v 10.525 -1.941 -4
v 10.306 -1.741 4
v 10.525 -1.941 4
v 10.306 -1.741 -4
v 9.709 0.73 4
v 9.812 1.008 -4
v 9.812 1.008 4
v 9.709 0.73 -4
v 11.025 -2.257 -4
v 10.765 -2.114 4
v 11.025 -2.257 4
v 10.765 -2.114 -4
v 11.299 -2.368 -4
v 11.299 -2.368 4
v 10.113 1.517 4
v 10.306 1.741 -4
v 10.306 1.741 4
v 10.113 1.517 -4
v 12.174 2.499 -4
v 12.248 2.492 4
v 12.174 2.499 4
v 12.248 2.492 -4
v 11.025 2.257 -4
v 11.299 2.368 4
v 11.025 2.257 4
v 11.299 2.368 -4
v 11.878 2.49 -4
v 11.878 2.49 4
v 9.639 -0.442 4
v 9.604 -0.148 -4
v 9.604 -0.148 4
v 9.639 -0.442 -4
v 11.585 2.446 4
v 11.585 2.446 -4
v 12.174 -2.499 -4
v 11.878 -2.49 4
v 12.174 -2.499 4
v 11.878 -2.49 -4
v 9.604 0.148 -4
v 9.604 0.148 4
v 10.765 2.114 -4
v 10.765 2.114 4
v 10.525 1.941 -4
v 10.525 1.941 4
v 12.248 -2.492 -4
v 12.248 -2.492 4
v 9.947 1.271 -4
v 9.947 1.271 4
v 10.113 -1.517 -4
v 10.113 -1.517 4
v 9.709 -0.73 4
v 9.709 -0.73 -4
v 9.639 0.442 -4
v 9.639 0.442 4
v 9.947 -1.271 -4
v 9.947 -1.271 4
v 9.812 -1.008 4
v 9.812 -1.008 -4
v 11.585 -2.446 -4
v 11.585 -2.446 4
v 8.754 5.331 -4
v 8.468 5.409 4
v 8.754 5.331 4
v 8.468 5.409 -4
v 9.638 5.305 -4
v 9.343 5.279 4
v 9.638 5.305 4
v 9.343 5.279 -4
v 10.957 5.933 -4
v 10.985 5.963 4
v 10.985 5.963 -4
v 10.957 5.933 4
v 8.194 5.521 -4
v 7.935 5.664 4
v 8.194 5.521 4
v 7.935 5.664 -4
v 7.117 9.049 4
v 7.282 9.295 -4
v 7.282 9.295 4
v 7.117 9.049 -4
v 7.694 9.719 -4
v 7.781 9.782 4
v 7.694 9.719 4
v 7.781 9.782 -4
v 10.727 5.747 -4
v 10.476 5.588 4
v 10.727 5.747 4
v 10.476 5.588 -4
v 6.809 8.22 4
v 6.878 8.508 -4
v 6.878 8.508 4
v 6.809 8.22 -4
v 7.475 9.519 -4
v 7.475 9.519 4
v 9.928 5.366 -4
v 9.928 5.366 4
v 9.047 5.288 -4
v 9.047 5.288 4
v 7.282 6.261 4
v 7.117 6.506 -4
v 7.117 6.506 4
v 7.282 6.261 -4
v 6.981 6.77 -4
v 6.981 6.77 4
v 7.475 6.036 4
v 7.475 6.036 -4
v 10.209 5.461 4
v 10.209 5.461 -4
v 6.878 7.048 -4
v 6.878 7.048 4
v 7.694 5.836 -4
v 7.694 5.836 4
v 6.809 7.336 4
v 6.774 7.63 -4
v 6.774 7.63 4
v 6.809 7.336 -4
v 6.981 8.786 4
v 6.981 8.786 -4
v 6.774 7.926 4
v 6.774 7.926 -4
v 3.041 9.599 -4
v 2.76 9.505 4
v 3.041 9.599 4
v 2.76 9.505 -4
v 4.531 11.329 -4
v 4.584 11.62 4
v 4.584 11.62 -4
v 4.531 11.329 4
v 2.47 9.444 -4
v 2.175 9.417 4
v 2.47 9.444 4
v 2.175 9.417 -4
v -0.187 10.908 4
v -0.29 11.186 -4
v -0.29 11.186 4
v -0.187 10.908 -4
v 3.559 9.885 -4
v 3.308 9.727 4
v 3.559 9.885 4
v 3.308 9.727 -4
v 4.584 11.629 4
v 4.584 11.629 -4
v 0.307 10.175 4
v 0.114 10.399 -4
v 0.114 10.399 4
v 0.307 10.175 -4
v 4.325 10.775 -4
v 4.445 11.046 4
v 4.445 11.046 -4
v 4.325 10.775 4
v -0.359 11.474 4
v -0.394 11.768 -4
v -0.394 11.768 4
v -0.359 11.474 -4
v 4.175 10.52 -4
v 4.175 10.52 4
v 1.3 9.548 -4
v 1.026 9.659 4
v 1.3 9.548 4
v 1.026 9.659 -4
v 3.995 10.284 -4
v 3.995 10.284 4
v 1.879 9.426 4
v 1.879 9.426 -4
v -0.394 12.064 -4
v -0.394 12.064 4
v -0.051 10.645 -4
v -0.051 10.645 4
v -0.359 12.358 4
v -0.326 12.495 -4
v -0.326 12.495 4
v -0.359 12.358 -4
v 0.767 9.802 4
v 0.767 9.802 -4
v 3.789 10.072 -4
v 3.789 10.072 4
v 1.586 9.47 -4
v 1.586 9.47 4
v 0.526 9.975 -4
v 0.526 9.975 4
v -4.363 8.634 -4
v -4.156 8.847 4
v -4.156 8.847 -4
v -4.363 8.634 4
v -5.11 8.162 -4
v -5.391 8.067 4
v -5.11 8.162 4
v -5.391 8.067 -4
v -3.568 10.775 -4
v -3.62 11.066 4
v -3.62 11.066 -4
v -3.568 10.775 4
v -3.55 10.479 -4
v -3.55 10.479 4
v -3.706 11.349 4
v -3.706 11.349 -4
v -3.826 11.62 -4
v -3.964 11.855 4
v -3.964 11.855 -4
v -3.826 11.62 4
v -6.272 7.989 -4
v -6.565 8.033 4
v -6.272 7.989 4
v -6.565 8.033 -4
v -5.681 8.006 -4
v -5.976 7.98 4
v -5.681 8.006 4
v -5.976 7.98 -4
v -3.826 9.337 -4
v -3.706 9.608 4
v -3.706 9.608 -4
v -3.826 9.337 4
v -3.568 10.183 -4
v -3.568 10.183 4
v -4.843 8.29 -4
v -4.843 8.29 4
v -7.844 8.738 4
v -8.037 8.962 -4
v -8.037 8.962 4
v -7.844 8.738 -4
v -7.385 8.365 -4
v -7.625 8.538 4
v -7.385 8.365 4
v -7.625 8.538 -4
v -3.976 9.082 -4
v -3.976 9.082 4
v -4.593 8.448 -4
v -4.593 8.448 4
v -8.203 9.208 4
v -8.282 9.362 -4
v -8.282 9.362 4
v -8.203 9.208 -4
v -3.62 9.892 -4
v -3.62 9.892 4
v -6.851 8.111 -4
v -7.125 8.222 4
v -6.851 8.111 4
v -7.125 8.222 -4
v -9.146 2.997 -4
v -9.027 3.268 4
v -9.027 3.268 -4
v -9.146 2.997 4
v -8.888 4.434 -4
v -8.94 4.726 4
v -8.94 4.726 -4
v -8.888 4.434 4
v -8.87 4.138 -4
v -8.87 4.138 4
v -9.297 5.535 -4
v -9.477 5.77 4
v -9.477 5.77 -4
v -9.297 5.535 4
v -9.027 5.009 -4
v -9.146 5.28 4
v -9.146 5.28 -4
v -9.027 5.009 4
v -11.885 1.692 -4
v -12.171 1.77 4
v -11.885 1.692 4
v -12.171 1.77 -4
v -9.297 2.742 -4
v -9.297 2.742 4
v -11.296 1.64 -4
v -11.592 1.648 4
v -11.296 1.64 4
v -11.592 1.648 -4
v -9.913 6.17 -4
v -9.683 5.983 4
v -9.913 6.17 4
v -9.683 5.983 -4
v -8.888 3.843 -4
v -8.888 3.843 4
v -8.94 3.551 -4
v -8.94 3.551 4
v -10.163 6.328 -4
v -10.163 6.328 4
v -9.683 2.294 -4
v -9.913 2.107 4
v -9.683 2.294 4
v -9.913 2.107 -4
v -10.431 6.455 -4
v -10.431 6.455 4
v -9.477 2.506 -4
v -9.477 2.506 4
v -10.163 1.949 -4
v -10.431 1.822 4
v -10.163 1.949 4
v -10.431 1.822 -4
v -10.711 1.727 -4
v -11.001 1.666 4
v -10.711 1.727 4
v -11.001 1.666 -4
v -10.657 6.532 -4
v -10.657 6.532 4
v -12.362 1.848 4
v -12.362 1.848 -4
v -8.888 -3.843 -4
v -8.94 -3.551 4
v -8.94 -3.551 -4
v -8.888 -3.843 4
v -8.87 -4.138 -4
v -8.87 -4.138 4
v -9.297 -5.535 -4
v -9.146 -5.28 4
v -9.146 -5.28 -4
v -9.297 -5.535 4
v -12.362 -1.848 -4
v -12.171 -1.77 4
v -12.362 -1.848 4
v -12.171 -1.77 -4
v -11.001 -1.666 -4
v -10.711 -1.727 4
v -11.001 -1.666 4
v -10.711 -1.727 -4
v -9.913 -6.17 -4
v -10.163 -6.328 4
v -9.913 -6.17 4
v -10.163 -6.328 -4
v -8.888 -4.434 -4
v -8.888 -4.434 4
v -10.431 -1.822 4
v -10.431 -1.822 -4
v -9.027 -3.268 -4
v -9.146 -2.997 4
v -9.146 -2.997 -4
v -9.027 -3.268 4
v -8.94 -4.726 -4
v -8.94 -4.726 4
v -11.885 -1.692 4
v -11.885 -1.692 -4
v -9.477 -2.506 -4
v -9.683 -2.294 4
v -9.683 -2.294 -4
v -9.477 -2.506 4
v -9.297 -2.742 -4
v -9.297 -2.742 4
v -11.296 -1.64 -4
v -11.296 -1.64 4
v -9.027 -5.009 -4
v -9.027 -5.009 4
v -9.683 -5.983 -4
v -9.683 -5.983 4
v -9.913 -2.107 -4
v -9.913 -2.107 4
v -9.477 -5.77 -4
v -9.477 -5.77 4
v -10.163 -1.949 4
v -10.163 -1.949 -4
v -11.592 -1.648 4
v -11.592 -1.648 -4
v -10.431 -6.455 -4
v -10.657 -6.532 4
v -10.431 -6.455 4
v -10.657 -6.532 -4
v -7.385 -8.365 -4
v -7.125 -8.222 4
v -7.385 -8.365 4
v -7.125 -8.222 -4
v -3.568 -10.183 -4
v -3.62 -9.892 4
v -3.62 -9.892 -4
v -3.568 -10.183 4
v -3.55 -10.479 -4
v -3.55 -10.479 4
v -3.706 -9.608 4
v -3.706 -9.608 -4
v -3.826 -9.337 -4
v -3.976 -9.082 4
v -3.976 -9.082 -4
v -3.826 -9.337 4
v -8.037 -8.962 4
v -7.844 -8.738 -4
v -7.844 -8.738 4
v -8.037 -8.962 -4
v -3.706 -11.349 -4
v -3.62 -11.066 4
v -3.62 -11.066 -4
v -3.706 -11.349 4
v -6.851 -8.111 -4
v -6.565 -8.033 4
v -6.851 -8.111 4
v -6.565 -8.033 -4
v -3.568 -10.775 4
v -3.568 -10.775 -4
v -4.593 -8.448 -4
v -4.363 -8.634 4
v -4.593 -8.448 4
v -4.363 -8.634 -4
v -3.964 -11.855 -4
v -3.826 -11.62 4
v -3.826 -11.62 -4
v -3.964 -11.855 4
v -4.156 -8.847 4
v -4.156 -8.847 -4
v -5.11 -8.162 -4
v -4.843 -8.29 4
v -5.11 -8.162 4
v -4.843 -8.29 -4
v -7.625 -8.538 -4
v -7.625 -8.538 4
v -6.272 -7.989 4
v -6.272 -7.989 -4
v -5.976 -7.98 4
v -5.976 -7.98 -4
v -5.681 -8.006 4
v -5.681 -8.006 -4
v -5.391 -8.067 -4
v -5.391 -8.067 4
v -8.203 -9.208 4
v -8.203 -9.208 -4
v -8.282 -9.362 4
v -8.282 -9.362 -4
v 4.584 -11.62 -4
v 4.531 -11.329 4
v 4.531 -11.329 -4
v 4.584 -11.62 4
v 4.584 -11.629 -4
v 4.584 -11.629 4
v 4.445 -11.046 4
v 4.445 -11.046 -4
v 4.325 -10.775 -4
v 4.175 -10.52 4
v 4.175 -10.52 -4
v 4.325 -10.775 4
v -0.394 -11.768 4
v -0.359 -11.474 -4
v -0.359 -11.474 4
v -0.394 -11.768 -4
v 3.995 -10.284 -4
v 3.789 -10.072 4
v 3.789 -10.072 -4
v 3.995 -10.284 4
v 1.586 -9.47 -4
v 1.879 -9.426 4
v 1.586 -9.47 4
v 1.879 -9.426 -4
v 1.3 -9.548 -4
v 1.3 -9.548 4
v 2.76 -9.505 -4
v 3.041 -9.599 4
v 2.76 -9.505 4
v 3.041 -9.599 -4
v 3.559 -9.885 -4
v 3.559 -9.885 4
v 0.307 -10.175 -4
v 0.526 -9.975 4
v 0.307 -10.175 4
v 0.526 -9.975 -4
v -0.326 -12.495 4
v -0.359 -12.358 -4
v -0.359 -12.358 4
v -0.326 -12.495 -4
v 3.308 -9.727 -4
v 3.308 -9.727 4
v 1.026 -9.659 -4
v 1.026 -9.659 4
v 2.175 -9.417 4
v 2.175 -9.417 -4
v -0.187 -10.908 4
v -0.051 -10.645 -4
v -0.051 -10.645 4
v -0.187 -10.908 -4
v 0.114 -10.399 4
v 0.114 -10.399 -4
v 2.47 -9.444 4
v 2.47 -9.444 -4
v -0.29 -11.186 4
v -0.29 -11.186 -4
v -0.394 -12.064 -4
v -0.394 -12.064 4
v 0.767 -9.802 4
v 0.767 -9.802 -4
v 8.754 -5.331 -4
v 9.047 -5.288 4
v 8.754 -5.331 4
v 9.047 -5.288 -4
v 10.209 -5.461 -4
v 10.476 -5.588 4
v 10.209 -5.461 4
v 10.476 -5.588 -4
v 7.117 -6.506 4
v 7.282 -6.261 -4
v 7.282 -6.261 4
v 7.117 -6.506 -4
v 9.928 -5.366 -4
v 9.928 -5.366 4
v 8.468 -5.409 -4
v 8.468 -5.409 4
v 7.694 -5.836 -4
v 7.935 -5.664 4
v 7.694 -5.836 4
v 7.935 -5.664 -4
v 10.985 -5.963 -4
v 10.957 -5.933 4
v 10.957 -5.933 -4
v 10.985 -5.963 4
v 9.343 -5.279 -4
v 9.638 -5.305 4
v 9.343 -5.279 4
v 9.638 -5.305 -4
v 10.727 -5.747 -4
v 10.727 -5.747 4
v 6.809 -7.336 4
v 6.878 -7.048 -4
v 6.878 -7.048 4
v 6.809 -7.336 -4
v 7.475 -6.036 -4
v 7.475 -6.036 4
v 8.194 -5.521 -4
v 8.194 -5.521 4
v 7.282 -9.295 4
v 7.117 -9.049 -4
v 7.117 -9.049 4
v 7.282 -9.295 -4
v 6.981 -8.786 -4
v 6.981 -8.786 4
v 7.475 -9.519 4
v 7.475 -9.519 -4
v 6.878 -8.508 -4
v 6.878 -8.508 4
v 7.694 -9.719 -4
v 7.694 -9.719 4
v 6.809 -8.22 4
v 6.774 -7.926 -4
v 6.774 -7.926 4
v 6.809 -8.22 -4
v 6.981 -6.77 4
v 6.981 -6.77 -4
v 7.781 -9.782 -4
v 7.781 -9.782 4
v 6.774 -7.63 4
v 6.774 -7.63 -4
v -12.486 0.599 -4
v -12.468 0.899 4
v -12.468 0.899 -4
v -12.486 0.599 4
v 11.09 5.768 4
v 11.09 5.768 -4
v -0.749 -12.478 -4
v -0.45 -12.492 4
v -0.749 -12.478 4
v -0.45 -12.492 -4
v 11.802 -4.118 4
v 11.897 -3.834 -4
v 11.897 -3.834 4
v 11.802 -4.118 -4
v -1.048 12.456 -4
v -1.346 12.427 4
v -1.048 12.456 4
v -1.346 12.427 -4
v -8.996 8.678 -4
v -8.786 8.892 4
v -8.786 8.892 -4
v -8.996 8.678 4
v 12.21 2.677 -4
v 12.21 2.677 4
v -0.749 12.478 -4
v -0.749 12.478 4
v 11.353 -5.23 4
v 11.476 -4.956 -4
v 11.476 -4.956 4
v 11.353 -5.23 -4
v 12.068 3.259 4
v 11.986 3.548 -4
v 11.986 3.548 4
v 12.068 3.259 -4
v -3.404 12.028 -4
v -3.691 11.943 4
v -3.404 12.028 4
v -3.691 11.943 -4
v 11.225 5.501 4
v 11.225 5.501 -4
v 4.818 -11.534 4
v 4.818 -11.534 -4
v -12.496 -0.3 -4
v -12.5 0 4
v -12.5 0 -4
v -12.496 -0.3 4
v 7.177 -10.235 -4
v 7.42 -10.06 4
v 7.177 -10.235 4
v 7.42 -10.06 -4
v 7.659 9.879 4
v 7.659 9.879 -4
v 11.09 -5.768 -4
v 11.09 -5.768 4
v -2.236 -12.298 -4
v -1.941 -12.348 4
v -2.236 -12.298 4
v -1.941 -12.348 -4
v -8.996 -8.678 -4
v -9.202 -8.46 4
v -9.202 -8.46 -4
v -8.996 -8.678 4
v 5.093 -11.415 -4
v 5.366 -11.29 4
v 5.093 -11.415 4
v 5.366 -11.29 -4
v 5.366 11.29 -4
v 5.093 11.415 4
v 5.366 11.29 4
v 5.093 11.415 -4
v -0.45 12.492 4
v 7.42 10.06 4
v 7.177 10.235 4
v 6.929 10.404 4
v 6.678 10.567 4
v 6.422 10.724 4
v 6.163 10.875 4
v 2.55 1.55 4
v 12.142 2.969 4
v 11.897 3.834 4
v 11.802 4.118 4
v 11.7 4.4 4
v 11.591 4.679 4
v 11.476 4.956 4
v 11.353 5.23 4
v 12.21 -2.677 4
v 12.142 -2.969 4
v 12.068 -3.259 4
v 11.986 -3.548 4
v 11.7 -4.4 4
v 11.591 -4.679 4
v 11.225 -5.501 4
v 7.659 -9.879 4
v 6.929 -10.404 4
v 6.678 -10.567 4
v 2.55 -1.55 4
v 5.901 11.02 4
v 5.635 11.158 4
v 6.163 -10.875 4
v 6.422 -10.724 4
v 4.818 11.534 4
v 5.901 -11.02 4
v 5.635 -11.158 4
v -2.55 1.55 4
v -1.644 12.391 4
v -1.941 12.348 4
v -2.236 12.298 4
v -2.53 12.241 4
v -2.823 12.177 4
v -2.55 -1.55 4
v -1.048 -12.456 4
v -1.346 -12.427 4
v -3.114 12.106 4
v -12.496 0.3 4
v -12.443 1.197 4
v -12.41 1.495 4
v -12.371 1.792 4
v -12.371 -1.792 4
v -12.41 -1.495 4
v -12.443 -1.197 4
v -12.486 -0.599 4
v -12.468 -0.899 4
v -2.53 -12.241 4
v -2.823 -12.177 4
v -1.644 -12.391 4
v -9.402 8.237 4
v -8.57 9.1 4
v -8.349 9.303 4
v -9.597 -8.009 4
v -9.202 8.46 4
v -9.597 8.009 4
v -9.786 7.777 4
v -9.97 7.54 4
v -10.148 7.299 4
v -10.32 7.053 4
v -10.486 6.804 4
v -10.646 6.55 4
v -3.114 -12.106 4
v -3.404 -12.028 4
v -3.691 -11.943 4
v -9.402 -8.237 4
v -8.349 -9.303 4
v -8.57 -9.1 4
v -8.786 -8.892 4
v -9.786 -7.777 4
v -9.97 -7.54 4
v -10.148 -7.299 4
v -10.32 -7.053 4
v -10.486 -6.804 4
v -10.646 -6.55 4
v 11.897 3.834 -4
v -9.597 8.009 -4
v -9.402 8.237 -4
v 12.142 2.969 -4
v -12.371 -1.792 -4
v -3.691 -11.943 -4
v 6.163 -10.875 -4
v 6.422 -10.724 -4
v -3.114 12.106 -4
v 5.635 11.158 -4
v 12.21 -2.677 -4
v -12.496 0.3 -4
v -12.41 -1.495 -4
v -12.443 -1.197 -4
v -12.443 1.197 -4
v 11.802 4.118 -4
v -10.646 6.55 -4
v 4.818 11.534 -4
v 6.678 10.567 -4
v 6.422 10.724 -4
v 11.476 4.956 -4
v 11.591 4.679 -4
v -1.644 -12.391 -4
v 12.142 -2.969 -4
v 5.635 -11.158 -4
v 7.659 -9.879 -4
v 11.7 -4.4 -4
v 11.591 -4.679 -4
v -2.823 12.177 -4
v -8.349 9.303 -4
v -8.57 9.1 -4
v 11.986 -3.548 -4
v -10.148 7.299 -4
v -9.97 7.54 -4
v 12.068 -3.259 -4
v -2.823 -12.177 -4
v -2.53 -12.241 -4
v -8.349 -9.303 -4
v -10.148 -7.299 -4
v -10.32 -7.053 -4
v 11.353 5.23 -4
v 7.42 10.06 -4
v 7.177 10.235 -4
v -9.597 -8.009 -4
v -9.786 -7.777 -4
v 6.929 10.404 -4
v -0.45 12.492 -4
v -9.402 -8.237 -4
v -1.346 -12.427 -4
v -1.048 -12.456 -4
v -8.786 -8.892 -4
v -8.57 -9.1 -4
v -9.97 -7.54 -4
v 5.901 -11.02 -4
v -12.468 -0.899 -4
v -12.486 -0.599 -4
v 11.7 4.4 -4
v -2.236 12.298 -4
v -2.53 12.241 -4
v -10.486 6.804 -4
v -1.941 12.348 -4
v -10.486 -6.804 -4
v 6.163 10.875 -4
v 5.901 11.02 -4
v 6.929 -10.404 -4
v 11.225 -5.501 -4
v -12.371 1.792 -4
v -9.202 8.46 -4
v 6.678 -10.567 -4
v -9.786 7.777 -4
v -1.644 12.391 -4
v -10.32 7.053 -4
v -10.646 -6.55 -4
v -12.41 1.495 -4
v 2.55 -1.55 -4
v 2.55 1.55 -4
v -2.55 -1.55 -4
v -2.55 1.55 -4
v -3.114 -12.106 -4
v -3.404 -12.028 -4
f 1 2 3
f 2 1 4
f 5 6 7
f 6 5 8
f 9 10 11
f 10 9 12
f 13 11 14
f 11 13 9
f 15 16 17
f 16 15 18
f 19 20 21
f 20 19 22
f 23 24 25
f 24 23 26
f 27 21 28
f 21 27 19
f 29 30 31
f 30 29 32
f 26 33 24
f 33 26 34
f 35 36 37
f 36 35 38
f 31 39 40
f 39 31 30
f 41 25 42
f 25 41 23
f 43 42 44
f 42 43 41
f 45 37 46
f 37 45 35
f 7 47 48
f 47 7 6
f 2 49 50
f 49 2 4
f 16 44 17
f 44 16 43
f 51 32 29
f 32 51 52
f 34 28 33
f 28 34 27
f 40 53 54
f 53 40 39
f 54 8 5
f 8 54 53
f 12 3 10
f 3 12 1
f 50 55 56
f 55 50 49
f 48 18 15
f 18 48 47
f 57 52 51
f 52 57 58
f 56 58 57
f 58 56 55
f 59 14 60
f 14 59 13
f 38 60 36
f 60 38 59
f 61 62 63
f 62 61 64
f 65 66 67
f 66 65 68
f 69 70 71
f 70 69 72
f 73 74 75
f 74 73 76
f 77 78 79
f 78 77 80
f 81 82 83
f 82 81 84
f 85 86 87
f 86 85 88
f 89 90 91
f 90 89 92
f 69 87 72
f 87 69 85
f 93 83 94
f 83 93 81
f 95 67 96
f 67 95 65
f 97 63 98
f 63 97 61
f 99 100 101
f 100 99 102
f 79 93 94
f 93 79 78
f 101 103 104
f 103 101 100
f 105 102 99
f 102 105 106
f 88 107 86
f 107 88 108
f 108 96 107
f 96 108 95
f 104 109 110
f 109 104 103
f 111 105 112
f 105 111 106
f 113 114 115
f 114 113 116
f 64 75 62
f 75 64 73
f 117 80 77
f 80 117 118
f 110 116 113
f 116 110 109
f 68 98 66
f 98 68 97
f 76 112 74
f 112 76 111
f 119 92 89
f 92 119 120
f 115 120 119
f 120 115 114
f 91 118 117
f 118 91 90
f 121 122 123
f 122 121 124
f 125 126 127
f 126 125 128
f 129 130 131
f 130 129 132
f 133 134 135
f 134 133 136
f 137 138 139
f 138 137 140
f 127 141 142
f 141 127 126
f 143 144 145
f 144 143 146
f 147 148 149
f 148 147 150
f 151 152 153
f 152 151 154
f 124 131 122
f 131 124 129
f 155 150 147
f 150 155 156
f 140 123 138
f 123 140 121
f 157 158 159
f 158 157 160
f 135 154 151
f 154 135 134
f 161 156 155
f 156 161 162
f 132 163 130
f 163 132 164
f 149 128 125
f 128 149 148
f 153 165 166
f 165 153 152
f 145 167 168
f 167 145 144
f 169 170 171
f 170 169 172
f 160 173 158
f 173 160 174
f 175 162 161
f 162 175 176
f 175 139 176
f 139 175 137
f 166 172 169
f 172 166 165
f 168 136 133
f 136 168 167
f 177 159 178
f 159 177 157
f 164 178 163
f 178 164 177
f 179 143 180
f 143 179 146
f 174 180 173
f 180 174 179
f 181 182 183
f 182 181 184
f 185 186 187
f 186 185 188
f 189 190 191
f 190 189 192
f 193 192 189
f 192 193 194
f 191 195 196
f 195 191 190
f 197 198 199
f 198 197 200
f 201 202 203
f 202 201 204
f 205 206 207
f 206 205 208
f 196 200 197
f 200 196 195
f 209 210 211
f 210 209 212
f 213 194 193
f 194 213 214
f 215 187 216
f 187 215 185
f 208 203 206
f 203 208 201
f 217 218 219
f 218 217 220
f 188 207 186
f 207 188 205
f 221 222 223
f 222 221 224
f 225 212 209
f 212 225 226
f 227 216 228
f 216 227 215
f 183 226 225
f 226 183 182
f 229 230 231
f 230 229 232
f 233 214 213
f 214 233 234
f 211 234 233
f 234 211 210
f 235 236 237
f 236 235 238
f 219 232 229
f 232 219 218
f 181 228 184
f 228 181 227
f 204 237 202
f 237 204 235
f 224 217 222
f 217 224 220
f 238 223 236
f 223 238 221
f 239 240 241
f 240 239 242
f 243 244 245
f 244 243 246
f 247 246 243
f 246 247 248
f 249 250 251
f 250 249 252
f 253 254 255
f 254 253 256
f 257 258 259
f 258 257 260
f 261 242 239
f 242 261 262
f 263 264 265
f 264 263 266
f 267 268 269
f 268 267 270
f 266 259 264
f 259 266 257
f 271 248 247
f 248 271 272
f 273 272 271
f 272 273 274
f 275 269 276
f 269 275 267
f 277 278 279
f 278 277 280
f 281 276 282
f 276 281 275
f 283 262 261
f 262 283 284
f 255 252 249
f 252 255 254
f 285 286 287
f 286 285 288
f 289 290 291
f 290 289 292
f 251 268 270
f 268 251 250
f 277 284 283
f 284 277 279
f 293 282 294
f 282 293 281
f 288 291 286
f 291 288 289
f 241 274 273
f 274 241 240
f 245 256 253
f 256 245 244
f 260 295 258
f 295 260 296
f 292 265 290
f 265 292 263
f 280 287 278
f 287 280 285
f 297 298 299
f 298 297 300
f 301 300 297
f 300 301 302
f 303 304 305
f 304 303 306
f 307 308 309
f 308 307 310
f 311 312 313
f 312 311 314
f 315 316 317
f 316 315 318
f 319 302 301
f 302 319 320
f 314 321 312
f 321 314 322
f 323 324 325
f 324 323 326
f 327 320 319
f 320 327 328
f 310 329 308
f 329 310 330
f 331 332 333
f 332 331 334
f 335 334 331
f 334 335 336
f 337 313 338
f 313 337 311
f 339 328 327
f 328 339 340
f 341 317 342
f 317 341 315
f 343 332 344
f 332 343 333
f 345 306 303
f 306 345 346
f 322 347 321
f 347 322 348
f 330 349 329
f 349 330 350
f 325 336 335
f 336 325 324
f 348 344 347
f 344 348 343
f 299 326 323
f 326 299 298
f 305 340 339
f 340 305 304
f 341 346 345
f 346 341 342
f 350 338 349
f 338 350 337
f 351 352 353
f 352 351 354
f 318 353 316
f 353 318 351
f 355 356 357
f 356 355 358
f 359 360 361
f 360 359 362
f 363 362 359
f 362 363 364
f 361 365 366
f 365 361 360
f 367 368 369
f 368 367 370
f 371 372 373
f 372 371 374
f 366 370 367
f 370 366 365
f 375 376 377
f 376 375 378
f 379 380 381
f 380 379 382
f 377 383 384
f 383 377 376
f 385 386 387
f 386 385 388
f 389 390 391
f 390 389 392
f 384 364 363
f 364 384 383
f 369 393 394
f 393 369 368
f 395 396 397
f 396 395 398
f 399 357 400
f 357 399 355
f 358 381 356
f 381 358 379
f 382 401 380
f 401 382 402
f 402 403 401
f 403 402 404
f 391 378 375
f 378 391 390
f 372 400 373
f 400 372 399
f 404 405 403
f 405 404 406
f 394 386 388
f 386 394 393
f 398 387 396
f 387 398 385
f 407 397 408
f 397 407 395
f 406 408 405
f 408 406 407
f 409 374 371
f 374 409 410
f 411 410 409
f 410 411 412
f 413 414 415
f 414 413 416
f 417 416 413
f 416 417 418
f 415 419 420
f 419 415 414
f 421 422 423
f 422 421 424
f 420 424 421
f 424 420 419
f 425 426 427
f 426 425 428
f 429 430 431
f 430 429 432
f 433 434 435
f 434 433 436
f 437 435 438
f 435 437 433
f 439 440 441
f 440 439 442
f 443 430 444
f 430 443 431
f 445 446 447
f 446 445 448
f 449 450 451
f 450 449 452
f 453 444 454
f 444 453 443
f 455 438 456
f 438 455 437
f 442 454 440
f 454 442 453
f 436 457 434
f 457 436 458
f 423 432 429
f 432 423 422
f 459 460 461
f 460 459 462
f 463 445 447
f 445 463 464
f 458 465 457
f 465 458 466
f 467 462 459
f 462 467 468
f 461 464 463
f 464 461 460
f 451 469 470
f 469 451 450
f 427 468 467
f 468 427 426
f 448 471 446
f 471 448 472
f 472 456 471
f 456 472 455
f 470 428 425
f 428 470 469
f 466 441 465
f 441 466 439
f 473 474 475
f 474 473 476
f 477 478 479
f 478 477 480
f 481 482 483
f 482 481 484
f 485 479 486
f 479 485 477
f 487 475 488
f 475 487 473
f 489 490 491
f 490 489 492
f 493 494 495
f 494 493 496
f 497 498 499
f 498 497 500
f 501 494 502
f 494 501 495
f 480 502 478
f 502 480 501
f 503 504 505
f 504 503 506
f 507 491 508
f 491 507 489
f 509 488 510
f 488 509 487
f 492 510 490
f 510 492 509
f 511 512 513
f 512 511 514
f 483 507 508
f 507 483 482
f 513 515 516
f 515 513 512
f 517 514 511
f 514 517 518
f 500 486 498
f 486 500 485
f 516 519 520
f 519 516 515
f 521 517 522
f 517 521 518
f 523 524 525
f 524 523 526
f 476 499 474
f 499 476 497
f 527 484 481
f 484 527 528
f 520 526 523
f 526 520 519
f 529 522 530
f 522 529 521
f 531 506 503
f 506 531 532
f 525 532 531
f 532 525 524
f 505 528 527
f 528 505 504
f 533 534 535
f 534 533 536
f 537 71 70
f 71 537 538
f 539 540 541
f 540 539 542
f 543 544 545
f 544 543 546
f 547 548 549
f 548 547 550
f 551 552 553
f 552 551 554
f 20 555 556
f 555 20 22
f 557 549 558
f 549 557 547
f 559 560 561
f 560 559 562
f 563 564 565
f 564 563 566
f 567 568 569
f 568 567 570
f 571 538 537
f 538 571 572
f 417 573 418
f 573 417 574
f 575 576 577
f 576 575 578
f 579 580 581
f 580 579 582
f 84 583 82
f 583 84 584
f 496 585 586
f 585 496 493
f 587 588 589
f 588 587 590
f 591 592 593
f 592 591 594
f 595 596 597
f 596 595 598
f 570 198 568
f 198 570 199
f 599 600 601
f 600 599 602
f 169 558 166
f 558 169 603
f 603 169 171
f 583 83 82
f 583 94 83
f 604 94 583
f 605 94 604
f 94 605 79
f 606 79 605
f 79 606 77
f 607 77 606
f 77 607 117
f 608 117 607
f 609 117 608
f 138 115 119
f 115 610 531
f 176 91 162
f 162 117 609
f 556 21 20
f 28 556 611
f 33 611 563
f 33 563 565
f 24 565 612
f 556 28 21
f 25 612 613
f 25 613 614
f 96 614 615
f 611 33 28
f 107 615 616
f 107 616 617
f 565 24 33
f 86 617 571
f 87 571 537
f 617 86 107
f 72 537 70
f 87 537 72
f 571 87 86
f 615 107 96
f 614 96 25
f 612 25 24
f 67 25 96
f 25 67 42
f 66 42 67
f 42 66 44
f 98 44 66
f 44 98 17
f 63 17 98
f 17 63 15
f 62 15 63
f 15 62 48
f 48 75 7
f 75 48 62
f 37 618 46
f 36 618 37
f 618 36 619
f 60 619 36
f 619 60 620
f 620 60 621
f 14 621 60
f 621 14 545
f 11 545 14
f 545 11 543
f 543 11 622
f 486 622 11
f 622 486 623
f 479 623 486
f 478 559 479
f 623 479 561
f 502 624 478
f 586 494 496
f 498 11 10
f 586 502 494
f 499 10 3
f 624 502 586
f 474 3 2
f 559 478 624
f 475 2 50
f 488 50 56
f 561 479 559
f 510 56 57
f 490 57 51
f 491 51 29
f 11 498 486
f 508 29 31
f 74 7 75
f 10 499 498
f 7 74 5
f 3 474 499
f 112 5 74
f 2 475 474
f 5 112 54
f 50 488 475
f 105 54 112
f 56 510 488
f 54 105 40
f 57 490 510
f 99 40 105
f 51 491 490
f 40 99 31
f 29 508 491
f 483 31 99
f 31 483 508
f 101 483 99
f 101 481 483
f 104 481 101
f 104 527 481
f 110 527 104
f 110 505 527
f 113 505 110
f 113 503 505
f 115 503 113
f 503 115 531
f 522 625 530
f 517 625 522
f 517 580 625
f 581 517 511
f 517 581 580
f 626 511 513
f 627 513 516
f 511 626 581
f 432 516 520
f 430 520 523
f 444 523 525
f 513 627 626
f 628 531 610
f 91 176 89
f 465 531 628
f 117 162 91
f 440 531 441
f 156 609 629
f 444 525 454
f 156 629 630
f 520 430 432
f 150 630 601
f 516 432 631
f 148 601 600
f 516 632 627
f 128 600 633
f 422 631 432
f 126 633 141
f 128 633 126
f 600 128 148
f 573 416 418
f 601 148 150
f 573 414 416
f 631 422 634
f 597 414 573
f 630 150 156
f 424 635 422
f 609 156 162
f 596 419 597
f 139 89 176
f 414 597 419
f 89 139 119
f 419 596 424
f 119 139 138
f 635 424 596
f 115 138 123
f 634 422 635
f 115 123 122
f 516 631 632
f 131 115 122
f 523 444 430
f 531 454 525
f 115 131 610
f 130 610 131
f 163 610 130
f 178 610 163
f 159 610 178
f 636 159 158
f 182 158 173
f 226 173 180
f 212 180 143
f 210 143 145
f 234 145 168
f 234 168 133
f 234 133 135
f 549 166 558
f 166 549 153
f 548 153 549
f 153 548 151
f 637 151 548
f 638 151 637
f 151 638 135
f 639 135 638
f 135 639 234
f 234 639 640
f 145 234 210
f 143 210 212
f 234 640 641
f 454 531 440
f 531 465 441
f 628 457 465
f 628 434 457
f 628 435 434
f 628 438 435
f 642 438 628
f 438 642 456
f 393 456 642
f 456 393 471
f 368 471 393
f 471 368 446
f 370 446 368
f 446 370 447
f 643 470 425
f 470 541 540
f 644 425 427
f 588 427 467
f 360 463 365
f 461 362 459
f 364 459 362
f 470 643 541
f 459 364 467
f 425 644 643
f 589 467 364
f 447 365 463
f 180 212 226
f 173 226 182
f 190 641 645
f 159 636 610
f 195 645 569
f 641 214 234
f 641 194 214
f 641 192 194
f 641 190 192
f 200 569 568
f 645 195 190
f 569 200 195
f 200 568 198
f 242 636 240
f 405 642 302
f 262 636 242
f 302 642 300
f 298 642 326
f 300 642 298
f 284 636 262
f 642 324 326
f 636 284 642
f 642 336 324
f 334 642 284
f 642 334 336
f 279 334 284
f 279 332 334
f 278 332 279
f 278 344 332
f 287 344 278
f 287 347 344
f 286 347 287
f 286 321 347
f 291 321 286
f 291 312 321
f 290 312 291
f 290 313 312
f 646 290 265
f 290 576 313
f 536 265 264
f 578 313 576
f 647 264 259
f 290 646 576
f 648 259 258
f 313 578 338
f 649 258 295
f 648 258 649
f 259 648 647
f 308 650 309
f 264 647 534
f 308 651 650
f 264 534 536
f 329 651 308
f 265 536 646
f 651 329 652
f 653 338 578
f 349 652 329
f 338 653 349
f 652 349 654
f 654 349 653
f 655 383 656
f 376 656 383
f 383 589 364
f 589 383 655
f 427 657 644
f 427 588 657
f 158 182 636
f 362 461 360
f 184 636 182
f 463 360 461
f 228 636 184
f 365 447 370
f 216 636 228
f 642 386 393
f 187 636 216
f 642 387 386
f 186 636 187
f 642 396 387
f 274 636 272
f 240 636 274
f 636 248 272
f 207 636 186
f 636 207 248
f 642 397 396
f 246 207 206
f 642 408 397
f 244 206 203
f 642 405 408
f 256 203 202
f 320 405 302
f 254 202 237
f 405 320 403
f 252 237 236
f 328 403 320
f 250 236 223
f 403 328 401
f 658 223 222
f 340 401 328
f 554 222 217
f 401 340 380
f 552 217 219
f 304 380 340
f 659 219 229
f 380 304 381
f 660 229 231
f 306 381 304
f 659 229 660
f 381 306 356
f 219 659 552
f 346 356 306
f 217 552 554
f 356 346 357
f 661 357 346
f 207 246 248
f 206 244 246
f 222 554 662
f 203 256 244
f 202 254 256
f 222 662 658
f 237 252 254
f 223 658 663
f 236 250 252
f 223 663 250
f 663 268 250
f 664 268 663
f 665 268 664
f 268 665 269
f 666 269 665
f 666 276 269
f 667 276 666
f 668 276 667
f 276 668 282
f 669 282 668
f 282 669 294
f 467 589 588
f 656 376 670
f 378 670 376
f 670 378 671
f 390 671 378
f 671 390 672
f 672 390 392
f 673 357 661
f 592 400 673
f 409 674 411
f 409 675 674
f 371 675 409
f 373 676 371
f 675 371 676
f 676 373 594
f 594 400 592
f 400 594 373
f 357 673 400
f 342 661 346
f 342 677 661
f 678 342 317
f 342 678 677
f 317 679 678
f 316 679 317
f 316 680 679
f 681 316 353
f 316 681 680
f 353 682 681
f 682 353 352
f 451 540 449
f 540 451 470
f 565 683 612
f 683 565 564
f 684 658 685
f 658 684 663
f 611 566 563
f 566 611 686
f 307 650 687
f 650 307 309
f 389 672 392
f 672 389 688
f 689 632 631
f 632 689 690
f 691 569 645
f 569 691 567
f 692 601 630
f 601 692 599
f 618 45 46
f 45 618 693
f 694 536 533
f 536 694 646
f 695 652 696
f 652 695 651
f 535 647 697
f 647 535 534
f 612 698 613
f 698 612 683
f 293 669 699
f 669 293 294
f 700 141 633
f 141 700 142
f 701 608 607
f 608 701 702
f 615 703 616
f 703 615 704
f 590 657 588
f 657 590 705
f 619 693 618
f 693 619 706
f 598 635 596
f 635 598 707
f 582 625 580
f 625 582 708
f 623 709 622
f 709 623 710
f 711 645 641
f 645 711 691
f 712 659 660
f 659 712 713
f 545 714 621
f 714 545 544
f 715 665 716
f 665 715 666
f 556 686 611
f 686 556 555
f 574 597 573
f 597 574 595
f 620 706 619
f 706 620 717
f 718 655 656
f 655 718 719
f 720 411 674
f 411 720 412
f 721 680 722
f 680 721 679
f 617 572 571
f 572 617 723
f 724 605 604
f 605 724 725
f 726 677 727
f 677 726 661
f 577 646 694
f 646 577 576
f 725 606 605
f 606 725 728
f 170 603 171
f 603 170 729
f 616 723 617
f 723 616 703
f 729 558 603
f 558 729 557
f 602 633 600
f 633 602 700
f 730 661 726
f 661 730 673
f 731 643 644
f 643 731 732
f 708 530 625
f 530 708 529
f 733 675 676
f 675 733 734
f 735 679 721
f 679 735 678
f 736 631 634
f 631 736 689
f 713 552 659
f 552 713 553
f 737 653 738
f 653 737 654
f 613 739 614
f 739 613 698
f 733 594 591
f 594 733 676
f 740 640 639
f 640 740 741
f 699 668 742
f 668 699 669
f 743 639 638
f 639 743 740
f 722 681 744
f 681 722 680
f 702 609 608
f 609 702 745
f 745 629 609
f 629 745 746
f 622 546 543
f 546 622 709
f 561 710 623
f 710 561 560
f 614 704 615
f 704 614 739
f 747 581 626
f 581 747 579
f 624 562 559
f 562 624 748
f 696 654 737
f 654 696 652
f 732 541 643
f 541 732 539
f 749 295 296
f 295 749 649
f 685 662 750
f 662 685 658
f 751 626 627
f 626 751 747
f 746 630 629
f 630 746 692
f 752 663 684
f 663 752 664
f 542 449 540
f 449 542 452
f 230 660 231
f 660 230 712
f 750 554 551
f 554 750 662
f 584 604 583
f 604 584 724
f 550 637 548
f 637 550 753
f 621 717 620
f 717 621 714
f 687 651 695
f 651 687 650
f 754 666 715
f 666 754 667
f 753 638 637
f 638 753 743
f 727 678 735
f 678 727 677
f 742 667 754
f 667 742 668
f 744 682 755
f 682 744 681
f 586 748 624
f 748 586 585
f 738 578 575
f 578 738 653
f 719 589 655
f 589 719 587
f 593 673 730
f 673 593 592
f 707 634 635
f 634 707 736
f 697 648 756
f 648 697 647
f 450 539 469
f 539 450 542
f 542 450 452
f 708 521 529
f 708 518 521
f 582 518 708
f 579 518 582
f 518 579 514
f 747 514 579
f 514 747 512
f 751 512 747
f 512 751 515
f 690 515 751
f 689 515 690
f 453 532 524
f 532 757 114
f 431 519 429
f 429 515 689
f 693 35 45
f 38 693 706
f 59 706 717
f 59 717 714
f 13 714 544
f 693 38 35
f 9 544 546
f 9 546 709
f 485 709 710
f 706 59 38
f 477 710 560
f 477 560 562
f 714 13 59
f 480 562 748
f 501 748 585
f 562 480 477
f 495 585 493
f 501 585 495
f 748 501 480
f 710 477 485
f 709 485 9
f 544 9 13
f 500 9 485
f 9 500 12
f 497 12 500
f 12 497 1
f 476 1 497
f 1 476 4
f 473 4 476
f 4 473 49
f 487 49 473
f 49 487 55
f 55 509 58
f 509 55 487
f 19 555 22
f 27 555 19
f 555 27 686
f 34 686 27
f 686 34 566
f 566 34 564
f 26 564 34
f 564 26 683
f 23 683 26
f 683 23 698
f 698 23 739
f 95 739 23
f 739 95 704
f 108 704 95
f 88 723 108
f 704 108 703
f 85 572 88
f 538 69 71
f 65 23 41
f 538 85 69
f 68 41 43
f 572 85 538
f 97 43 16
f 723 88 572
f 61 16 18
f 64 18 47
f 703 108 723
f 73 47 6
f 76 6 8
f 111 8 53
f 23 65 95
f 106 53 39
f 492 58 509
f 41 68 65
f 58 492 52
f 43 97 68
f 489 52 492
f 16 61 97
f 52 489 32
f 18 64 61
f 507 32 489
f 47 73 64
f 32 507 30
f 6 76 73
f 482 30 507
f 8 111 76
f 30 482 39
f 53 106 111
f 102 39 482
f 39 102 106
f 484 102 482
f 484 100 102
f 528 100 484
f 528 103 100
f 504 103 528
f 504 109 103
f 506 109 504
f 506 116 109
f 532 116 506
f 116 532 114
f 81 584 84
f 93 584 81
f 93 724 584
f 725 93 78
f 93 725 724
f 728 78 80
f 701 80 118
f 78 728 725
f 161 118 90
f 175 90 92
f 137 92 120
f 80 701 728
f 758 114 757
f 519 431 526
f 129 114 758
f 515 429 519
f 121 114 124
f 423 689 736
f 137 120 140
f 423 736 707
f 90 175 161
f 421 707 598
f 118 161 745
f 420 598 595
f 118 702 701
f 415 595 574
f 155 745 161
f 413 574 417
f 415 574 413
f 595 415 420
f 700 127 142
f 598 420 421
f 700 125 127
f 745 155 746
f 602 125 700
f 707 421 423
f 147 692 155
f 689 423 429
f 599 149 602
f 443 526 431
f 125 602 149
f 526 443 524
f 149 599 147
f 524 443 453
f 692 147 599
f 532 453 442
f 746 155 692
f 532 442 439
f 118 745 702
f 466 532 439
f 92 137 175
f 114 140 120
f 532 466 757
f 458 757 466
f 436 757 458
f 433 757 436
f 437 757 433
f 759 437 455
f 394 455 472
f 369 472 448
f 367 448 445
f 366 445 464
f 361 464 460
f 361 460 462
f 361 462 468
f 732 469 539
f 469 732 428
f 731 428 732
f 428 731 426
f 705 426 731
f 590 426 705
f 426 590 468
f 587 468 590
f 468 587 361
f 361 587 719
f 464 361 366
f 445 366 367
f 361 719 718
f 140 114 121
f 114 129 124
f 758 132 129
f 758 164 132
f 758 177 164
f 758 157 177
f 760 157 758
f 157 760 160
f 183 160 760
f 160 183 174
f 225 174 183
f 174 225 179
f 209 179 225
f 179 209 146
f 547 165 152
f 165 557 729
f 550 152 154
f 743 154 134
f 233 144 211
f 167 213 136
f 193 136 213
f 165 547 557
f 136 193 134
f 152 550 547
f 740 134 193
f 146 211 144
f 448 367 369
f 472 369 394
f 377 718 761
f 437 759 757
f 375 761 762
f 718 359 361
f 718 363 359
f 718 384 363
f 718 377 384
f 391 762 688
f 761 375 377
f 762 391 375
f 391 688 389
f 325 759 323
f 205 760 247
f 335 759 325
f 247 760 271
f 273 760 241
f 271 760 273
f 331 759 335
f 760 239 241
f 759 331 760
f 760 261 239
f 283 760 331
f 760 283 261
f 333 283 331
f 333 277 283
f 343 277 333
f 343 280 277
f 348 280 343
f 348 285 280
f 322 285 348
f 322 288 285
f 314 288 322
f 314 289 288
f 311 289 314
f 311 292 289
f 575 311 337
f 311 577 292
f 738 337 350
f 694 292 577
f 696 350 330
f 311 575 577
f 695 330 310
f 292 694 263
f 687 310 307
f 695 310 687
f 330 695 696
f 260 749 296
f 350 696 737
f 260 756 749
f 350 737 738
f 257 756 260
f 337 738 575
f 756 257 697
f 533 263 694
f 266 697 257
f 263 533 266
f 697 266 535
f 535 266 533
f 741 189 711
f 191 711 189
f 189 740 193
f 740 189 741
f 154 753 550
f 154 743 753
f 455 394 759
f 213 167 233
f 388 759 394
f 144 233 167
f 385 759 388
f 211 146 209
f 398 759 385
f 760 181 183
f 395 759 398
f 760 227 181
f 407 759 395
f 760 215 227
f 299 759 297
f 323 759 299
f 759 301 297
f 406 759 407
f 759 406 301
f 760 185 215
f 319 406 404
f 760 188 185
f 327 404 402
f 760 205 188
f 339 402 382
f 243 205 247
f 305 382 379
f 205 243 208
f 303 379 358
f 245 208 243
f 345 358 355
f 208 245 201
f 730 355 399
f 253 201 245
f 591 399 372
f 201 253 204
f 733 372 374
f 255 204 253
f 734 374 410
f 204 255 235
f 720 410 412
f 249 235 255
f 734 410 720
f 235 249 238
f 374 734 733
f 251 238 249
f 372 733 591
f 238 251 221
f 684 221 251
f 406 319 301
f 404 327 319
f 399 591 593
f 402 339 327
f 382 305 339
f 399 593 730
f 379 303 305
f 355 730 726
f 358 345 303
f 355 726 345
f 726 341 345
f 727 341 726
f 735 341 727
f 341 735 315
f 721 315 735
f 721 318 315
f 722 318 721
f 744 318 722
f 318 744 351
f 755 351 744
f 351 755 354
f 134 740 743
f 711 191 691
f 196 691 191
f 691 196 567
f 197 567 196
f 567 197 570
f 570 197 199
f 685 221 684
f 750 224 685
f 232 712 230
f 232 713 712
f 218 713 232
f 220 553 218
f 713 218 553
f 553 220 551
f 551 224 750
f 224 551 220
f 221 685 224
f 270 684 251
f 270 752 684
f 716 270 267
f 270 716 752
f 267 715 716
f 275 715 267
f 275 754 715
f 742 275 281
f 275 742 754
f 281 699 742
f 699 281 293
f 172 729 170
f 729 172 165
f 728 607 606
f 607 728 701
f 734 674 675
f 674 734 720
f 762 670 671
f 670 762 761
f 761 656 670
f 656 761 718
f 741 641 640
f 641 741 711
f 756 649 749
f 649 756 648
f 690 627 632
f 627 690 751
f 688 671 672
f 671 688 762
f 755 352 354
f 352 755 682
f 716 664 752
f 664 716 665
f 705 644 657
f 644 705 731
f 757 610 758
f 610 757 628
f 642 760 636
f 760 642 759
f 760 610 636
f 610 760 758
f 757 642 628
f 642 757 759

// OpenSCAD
$fa = .3;	// minimum angle 
$fs = .3;	// minimum size 
difference(){
    cylinder(h=8,d=25, center=true);
    cube([5.1,3.1,14], center=true);
    for(i=[0:40:360]){
            translate([cos(i)*12.1,sin(i)*12.1,0]){
                     cylinder(h=20,d=5,center=true);
            }
        };
    }
